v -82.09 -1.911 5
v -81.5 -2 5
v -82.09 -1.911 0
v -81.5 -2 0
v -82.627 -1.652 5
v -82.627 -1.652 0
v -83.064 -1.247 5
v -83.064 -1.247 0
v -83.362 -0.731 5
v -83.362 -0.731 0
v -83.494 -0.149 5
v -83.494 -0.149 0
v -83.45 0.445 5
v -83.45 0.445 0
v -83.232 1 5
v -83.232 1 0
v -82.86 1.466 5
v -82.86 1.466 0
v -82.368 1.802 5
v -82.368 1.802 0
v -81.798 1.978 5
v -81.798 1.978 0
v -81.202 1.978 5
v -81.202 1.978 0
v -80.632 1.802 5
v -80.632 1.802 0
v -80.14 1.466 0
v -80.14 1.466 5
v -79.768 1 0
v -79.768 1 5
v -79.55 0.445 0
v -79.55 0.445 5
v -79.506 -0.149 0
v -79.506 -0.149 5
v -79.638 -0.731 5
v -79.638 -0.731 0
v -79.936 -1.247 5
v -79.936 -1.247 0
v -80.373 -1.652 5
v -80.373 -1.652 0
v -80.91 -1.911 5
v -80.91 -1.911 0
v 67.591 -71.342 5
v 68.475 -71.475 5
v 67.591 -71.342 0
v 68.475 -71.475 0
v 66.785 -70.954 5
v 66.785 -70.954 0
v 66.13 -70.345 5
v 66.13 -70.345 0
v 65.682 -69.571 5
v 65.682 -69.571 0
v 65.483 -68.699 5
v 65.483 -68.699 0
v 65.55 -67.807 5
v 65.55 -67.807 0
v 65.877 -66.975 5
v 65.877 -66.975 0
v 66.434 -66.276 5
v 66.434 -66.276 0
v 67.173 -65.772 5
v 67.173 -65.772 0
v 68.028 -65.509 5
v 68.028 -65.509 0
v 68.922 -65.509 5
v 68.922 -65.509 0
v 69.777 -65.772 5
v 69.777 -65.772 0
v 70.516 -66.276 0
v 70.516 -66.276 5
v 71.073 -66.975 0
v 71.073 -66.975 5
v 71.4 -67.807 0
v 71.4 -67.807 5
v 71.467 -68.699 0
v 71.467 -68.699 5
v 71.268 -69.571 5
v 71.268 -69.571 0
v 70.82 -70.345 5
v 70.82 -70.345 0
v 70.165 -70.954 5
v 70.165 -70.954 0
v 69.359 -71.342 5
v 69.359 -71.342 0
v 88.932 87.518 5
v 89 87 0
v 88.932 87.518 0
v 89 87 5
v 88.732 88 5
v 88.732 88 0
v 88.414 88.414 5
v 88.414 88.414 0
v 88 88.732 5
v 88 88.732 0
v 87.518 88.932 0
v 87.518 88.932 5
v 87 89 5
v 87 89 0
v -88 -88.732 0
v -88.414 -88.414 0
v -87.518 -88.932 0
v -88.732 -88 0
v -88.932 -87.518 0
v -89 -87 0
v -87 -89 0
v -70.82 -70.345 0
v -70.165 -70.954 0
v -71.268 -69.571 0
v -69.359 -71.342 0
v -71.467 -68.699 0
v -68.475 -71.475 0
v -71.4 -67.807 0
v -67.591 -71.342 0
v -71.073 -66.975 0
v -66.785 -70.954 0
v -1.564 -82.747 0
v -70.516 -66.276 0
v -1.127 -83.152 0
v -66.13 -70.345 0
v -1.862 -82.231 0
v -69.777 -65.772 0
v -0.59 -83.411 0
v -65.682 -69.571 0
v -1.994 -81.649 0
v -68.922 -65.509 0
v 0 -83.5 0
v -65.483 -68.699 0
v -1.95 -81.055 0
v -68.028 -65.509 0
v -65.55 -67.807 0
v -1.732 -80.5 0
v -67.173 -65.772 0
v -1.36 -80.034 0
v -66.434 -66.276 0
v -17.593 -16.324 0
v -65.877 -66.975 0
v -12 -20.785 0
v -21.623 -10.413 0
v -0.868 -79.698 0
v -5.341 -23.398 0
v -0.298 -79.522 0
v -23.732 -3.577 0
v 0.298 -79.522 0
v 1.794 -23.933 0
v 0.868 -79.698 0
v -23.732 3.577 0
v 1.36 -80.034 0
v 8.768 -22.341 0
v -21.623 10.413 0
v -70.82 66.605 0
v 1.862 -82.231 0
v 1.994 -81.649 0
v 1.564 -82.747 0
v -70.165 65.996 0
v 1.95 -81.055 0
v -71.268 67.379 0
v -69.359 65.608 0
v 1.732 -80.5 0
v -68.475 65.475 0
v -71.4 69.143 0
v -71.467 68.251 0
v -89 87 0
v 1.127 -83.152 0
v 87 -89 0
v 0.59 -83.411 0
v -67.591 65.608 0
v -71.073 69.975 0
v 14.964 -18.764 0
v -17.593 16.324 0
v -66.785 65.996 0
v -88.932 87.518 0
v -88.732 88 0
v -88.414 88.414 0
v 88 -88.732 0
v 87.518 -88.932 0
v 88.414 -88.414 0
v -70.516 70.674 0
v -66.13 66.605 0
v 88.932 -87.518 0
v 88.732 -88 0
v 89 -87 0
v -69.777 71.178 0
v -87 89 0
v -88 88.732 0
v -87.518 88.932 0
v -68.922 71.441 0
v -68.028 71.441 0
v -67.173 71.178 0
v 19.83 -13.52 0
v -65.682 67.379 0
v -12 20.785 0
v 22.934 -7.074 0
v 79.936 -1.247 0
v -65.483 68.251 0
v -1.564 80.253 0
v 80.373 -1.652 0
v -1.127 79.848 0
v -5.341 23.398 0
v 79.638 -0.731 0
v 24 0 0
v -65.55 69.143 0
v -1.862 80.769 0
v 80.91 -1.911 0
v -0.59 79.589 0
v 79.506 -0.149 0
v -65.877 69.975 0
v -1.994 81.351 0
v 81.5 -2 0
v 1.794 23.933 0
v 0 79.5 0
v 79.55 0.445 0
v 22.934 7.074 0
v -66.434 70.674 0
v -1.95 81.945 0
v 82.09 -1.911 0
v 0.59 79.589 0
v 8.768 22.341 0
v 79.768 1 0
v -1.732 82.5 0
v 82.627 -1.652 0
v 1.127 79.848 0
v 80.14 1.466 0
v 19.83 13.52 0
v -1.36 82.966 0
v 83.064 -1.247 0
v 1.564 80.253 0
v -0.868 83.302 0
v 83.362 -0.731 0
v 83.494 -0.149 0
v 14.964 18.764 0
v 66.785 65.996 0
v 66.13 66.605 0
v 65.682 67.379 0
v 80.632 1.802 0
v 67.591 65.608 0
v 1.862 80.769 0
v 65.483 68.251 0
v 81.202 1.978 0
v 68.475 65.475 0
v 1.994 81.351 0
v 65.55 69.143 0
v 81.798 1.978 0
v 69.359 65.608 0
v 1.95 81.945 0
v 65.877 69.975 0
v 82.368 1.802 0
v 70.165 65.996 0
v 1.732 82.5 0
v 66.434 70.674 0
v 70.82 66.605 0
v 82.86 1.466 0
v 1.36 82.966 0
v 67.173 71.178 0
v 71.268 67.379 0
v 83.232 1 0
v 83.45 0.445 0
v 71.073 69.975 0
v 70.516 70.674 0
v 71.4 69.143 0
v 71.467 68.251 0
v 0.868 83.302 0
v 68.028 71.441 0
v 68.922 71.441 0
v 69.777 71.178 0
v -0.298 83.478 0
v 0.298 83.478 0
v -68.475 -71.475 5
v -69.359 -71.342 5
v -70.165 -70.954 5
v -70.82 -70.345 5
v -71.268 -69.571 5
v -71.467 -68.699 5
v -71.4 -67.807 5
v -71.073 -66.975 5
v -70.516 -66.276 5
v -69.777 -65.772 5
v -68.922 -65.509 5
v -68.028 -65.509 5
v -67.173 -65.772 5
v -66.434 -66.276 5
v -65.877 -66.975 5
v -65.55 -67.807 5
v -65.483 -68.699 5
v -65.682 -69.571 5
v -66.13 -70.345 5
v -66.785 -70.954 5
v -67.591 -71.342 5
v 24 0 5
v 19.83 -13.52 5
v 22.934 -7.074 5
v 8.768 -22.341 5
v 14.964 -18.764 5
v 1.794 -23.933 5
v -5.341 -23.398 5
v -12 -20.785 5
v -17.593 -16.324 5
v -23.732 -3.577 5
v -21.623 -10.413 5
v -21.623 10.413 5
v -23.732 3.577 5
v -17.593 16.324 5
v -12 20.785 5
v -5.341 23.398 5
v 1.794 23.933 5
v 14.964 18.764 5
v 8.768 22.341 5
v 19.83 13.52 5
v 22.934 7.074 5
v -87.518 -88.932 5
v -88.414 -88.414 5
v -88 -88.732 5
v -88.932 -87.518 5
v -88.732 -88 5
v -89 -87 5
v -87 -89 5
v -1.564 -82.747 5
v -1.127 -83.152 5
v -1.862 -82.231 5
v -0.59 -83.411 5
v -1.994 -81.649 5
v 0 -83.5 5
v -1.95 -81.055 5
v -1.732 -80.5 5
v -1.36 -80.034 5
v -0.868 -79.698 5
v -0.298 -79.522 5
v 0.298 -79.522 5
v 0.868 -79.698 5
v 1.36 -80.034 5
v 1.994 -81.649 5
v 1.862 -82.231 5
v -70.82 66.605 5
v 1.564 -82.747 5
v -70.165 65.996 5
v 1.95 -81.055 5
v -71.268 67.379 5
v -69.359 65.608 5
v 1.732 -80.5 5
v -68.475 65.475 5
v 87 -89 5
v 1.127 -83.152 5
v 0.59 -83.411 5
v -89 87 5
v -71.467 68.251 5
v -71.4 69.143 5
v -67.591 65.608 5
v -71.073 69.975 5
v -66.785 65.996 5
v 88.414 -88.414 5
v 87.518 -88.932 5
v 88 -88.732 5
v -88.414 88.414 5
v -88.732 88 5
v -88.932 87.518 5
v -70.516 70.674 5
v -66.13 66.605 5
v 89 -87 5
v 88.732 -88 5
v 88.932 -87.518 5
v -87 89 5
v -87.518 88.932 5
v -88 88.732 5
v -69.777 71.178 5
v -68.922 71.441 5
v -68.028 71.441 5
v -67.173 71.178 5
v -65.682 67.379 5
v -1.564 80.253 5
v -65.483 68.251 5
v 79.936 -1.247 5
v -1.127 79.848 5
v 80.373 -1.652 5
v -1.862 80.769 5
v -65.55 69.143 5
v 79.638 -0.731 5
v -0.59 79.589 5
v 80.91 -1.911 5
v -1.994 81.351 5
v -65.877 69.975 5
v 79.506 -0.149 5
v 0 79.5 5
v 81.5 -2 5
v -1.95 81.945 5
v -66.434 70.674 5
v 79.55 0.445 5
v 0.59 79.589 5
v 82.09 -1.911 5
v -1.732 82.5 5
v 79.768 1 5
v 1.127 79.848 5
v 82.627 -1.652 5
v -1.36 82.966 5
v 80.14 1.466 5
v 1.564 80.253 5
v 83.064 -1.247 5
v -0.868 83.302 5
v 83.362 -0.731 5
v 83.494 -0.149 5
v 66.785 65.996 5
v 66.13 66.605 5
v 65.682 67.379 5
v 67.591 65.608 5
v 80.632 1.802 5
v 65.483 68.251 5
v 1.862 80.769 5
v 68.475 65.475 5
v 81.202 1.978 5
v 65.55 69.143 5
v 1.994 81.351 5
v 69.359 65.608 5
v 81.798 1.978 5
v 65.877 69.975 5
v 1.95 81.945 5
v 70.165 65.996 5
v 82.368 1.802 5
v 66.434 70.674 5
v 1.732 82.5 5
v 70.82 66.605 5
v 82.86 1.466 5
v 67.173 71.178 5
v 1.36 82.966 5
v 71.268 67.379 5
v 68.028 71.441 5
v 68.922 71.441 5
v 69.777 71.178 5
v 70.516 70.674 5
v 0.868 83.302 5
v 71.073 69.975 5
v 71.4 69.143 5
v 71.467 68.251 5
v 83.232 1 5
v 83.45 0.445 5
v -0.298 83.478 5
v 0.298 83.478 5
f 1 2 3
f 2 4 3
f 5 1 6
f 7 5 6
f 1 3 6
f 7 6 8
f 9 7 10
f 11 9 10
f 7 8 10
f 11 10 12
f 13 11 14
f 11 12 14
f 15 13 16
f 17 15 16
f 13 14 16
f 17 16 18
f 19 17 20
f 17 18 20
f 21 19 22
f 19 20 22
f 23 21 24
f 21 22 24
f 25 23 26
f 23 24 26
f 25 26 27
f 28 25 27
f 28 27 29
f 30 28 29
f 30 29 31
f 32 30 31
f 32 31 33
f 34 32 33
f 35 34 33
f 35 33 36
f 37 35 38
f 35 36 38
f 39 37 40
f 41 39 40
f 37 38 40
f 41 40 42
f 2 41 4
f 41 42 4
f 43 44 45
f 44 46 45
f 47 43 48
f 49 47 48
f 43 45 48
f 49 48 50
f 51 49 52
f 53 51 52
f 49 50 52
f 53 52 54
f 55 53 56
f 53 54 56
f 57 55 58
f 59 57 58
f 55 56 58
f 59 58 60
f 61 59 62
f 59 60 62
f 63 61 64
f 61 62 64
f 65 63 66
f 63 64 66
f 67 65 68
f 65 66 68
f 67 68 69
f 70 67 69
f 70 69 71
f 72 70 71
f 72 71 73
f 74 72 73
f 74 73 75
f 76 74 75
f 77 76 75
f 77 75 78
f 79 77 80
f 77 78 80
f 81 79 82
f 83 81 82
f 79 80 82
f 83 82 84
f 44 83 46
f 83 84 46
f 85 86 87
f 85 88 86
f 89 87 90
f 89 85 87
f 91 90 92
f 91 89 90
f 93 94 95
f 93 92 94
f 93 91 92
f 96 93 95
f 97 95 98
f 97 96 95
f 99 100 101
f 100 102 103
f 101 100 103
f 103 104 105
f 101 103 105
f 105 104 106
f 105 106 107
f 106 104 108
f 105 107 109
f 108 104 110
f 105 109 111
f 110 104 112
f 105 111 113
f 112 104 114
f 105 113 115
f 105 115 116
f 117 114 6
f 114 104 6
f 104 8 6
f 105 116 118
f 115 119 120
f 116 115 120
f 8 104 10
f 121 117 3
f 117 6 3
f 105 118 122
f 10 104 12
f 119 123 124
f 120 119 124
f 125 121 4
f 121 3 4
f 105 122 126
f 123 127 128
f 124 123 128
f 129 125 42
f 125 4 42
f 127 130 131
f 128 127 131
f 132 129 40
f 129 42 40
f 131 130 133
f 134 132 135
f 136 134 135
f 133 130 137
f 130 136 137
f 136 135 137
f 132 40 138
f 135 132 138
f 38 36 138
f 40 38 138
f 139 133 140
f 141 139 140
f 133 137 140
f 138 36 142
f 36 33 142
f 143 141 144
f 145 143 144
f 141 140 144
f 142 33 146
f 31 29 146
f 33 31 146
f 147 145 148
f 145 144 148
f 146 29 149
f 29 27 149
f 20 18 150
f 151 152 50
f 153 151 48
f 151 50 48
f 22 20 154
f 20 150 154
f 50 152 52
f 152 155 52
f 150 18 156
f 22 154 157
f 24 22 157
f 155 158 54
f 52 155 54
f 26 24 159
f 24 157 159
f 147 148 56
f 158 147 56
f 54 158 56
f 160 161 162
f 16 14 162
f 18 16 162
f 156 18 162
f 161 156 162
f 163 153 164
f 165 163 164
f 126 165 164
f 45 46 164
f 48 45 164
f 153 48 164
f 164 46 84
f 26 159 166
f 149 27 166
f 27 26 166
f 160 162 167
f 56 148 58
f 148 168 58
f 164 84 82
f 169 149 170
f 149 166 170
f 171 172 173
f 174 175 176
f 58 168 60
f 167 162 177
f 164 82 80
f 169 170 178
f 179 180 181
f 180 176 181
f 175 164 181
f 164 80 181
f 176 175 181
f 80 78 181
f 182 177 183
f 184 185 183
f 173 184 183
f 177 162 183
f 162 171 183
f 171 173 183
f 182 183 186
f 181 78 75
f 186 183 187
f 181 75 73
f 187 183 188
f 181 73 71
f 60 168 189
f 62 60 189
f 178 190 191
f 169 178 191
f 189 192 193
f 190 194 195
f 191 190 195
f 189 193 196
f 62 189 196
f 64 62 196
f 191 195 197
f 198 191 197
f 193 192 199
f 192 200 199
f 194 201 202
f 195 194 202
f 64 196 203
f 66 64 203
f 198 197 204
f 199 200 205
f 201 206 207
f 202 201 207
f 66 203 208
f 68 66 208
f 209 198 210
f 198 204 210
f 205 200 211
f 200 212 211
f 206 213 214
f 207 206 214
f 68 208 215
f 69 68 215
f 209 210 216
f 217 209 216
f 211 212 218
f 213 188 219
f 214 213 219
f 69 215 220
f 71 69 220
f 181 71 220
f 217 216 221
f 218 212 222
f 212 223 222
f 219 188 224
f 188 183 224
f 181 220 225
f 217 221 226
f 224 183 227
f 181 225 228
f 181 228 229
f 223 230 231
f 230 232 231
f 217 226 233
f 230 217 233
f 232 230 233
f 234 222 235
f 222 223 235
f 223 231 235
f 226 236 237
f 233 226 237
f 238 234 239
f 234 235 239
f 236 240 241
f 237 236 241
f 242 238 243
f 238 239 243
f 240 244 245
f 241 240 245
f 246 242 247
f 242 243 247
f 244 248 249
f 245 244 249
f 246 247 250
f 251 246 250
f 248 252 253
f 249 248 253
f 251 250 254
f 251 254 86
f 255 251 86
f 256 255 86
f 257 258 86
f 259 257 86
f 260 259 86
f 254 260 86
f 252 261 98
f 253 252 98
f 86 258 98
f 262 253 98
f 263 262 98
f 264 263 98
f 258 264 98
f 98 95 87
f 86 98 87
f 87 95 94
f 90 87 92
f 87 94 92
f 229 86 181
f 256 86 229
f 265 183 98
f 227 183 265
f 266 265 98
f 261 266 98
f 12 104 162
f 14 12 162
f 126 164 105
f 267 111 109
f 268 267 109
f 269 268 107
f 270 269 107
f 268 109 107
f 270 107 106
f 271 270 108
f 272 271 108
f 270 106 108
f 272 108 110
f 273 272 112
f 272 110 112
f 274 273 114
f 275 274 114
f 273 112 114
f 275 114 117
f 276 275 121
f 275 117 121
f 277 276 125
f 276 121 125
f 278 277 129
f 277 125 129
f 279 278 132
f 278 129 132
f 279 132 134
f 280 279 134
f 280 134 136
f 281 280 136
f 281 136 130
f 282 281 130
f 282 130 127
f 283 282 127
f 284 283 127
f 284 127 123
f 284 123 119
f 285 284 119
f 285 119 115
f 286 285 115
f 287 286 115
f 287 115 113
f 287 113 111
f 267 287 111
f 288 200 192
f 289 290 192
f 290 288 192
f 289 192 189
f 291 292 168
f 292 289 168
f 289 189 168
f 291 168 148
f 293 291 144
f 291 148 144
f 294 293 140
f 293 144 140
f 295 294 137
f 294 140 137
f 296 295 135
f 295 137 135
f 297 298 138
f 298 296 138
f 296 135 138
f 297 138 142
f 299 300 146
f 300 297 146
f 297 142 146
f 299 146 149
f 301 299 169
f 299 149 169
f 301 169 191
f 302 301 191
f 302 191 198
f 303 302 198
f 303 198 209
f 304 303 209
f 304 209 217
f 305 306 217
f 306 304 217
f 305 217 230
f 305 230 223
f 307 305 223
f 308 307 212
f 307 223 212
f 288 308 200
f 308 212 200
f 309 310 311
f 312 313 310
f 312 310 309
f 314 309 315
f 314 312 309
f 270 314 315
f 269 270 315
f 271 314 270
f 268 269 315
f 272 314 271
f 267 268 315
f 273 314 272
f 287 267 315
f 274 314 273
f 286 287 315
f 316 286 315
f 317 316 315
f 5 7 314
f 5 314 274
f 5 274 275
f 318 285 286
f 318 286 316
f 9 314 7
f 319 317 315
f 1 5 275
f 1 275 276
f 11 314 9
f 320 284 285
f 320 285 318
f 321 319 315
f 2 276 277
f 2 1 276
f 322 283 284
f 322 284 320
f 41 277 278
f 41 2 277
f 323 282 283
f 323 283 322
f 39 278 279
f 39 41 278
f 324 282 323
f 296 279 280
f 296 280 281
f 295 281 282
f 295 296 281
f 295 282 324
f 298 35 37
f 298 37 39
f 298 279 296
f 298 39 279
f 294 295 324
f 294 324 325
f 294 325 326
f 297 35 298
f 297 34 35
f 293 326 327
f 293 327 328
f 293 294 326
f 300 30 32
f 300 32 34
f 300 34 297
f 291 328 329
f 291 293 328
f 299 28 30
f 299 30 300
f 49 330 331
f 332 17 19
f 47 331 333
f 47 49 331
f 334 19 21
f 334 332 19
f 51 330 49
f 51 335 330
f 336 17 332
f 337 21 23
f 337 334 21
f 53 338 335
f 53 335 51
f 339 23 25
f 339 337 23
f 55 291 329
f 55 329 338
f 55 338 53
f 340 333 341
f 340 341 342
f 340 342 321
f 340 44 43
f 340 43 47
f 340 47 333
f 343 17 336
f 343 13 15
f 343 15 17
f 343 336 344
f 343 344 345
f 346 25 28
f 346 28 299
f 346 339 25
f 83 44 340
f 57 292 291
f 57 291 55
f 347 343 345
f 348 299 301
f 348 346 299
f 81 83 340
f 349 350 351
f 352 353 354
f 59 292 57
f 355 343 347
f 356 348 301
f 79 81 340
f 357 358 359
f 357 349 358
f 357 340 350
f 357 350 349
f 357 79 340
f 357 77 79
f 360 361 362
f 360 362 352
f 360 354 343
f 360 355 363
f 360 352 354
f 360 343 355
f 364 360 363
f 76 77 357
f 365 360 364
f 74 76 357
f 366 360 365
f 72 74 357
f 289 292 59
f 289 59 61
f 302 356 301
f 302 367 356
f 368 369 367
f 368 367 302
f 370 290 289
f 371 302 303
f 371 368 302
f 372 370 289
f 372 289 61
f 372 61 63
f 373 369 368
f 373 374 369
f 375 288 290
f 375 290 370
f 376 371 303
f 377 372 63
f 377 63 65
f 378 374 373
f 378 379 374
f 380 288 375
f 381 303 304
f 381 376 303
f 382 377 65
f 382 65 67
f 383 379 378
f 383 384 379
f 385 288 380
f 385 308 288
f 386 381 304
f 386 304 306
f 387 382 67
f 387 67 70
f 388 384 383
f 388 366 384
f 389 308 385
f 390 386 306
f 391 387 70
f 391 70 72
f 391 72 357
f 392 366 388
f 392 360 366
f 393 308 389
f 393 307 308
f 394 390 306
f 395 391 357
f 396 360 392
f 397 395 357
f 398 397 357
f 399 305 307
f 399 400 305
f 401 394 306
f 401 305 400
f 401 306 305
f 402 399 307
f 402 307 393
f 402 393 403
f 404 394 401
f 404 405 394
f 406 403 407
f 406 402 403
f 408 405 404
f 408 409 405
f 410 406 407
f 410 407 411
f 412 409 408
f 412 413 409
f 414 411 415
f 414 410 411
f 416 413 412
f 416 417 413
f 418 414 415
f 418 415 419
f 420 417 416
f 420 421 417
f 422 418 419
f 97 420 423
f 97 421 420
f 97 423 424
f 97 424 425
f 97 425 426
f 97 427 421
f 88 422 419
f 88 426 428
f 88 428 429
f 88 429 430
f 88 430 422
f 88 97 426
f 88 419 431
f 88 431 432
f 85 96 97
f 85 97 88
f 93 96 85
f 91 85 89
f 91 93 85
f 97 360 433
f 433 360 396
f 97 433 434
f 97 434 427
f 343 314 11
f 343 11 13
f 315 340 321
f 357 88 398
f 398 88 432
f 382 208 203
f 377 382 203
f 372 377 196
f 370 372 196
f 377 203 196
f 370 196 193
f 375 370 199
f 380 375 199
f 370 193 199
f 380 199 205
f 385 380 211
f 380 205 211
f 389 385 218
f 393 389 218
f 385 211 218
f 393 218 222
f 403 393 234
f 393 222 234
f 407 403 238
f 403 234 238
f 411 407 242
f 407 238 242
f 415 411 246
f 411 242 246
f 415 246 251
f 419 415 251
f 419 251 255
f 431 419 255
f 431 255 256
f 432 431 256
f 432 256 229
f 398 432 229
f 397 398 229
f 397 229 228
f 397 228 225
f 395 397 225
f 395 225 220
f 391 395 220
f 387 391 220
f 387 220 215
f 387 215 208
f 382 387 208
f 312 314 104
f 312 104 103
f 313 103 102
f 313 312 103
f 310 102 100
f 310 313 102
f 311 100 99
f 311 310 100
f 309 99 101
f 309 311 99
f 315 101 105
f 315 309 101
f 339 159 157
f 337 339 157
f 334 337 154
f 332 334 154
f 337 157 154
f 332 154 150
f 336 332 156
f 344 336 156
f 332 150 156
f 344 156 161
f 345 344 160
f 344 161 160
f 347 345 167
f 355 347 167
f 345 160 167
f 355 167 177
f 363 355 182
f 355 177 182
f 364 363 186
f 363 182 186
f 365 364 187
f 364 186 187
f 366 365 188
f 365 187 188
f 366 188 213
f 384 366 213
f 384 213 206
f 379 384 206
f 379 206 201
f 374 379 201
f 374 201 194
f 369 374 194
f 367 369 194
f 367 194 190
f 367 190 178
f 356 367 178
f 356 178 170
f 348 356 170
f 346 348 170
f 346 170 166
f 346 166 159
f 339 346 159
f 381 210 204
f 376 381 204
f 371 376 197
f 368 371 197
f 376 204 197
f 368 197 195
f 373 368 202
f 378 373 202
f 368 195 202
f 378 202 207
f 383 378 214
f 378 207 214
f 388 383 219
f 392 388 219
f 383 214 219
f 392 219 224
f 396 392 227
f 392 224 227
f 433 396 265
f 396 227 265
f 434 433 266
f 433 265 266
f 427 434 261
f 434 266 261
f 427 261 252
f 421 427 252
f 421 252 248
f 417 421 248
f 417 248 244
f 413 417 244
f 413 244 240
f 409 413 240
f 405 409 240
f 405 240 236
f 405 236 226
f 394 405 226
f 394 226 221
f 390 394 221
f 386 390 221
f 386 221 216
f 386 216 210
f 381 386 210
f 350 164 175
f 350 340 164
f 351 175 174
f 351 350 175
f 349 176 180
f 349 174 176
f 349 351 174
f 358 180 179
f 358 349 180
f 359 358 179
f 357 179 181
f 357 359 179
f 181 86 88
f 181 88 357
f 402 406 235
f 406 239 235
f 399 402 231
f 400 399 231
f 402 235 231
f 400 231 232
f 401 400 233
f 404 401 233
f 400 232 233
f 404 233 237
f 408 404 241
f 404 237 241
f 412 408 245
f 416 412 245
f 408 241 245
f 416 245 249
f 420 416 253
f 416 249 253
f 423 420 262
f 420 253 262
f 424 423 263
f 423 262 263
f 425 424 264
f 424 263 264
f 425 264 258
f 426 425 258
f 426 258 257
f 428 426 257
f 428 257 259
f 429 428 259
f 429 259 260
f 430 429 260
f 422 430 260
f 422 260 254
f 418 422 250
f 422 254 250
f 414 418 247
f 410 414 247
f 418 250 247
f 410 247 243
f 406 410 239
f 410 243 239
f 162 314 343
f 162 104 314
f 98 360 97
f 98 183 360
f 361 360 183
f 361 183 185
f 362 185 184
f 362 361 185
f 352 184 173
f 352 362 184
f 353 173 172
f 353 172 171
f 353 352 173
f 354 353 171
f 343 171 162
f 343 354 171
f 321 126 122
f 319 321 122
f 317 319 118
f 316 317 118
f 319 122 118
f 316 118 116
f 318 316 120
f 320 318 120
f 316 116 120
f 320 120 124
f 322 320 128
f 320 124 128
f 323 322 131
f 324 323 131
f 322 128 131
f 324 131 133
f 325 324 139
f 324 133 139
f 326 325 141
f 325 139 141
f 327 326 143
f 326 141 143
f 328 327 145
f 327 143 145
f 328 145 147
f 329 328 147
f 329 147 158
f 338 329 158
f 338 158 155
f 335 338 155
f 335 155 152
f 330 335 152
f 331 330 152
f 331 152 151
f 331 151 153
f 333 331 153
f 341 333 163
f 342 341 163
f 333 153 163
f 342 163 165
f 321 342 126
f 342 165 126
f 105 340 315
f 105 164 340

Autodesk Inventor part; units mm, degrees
ref_plane "YZ Plane" through (0, 0, 0) normal (1, 0, 0) x (0, 1, 0)
ref_plane "XZ Plane" through (0, 0, 0) normal (0, 1, 0) x (-1, 0, 0)
ref_plane "XY Plane" through (0, 0, 0) normal (0, 0, 1) x (1, 0, 0)
sketch "Sketch1" plane through (0, 0, 0) normal (0, 0, 1) x (1, 0, 0)
  line L0 (-89, 89) -> (89, 89)
  line L1 (89, 89) -> (89, -89)
  line L2 (89, -89) -> (-89, -89)
  line L3 (-89, -89) -> (-89, 89)
  circle A0 centre (0, 0) radius 24
  dimension "d33" = 178
  dimension "d34" = 89
  dimension "d35" = 89
  dimension "d65" = 48
extrude "Extrusion1" add sketch "Sketch1" along normal blind 5
sketch "Sketch2" plane through (0, 0, 5) normal (0, 0, 1) x (1, 0, 0)
  circle A0 centre (-81.5, 0) radius 2
  circle A1 centre (81.5, 0) radius 2
  line L0 (-78.5, 36.125) -> (-78.5, 56.125) projected
  line L1 (78.5, 56.125) -> (78.5, 36.125) projected
  circle A2 centre (0, 81.5) radius 2
  circle A3 centre (0, -81.5) radius 2
  line L2 (36.125, 78.5) -> (56.125, 78.5) projected
  line L3 (56.125, -78.5) -> (36.125, -78.5) projected
  line L4 (-89, 89) -> (-89, -89) projected
  line L5 (89, 89) -> (-89, 89) projected
  line L6 (89, -89) -> (89, 89) projected
  line L7 (-89, -89) -> (89, -89) projected
  point P0 (0, 0)
  point P1 (-78.5, -56.125)
  point P2 (78.5, -56.125)
  point P3 (-56.125, 78.5)
  point P4 (-56.125, -78.5)
  dimension "d18" = 4
  dimension "d37" = 7.5
  dimension "d38" = 7.5
  dimension "d39" = 7.5
  dimension "d40" = 7.5
hole "Hole1" at (-81.5, 0, 5) at (0, 81.5, 5) at (81.5, 0, 5) at (0, -81.5, 5) direction (0, 0, -1) diameter 4 end through all
fillet "Fillet1" radius 2 4 edges at (-89, -89, 2.5) (-89, 89, 2.5) (89, -89, 2.5) (89, 89, 2.5)
sketch "Sketch3" plane through (0, 0, 5) normal (0, 0, 1) x (1, 0, 0)
  line L0 (68.475, -68.475) -> (-68.475, -68.475)
  line L1 (-68.475, -68.475) -> (-68.475, 68.475)
  line L2 (-68.475, 68.475) -> (68.475, 68.475)
  line L3 (68.475, 68.475) -> (68.475, -68.475)
  line L4 (68.475, -68.475) -> (-68.475, 68.475) construction
  line L5 (-68.475, -68.475) -> (68.475, 68.475) construction
  circle A0 centre (-68.475, 68.475) radius 4.875
  point P0 (0, 0)
  dimension "d31" = 136.95
  dimension "d32" = 9.75
hole "Hole2" at (-68.475, 68.475, 5) at (68.475, 68.475, 5) at (68.475, -68.475, 5) at (-68.475, -68.475, 5) direction (0, 0, -1) diameter 6 end through all
equation "\"d34\" = 0.5 * d33"
equation "\"d35\" = 0.5 * d33"
equation "\"d38\" = d37"
equation "\"d39\" = d37"
equation "\"d40\" = d37"
equation "\"d21\" = d18"
equation "\"d6\" = 0.5 * d3"
equation "\"d7\" = 0.5 * d2"
equation "\"d3\" = 157"
equation "\"d2\" = 157"
properties part number "WaagePlexiOben3" material "PET Plastic"
